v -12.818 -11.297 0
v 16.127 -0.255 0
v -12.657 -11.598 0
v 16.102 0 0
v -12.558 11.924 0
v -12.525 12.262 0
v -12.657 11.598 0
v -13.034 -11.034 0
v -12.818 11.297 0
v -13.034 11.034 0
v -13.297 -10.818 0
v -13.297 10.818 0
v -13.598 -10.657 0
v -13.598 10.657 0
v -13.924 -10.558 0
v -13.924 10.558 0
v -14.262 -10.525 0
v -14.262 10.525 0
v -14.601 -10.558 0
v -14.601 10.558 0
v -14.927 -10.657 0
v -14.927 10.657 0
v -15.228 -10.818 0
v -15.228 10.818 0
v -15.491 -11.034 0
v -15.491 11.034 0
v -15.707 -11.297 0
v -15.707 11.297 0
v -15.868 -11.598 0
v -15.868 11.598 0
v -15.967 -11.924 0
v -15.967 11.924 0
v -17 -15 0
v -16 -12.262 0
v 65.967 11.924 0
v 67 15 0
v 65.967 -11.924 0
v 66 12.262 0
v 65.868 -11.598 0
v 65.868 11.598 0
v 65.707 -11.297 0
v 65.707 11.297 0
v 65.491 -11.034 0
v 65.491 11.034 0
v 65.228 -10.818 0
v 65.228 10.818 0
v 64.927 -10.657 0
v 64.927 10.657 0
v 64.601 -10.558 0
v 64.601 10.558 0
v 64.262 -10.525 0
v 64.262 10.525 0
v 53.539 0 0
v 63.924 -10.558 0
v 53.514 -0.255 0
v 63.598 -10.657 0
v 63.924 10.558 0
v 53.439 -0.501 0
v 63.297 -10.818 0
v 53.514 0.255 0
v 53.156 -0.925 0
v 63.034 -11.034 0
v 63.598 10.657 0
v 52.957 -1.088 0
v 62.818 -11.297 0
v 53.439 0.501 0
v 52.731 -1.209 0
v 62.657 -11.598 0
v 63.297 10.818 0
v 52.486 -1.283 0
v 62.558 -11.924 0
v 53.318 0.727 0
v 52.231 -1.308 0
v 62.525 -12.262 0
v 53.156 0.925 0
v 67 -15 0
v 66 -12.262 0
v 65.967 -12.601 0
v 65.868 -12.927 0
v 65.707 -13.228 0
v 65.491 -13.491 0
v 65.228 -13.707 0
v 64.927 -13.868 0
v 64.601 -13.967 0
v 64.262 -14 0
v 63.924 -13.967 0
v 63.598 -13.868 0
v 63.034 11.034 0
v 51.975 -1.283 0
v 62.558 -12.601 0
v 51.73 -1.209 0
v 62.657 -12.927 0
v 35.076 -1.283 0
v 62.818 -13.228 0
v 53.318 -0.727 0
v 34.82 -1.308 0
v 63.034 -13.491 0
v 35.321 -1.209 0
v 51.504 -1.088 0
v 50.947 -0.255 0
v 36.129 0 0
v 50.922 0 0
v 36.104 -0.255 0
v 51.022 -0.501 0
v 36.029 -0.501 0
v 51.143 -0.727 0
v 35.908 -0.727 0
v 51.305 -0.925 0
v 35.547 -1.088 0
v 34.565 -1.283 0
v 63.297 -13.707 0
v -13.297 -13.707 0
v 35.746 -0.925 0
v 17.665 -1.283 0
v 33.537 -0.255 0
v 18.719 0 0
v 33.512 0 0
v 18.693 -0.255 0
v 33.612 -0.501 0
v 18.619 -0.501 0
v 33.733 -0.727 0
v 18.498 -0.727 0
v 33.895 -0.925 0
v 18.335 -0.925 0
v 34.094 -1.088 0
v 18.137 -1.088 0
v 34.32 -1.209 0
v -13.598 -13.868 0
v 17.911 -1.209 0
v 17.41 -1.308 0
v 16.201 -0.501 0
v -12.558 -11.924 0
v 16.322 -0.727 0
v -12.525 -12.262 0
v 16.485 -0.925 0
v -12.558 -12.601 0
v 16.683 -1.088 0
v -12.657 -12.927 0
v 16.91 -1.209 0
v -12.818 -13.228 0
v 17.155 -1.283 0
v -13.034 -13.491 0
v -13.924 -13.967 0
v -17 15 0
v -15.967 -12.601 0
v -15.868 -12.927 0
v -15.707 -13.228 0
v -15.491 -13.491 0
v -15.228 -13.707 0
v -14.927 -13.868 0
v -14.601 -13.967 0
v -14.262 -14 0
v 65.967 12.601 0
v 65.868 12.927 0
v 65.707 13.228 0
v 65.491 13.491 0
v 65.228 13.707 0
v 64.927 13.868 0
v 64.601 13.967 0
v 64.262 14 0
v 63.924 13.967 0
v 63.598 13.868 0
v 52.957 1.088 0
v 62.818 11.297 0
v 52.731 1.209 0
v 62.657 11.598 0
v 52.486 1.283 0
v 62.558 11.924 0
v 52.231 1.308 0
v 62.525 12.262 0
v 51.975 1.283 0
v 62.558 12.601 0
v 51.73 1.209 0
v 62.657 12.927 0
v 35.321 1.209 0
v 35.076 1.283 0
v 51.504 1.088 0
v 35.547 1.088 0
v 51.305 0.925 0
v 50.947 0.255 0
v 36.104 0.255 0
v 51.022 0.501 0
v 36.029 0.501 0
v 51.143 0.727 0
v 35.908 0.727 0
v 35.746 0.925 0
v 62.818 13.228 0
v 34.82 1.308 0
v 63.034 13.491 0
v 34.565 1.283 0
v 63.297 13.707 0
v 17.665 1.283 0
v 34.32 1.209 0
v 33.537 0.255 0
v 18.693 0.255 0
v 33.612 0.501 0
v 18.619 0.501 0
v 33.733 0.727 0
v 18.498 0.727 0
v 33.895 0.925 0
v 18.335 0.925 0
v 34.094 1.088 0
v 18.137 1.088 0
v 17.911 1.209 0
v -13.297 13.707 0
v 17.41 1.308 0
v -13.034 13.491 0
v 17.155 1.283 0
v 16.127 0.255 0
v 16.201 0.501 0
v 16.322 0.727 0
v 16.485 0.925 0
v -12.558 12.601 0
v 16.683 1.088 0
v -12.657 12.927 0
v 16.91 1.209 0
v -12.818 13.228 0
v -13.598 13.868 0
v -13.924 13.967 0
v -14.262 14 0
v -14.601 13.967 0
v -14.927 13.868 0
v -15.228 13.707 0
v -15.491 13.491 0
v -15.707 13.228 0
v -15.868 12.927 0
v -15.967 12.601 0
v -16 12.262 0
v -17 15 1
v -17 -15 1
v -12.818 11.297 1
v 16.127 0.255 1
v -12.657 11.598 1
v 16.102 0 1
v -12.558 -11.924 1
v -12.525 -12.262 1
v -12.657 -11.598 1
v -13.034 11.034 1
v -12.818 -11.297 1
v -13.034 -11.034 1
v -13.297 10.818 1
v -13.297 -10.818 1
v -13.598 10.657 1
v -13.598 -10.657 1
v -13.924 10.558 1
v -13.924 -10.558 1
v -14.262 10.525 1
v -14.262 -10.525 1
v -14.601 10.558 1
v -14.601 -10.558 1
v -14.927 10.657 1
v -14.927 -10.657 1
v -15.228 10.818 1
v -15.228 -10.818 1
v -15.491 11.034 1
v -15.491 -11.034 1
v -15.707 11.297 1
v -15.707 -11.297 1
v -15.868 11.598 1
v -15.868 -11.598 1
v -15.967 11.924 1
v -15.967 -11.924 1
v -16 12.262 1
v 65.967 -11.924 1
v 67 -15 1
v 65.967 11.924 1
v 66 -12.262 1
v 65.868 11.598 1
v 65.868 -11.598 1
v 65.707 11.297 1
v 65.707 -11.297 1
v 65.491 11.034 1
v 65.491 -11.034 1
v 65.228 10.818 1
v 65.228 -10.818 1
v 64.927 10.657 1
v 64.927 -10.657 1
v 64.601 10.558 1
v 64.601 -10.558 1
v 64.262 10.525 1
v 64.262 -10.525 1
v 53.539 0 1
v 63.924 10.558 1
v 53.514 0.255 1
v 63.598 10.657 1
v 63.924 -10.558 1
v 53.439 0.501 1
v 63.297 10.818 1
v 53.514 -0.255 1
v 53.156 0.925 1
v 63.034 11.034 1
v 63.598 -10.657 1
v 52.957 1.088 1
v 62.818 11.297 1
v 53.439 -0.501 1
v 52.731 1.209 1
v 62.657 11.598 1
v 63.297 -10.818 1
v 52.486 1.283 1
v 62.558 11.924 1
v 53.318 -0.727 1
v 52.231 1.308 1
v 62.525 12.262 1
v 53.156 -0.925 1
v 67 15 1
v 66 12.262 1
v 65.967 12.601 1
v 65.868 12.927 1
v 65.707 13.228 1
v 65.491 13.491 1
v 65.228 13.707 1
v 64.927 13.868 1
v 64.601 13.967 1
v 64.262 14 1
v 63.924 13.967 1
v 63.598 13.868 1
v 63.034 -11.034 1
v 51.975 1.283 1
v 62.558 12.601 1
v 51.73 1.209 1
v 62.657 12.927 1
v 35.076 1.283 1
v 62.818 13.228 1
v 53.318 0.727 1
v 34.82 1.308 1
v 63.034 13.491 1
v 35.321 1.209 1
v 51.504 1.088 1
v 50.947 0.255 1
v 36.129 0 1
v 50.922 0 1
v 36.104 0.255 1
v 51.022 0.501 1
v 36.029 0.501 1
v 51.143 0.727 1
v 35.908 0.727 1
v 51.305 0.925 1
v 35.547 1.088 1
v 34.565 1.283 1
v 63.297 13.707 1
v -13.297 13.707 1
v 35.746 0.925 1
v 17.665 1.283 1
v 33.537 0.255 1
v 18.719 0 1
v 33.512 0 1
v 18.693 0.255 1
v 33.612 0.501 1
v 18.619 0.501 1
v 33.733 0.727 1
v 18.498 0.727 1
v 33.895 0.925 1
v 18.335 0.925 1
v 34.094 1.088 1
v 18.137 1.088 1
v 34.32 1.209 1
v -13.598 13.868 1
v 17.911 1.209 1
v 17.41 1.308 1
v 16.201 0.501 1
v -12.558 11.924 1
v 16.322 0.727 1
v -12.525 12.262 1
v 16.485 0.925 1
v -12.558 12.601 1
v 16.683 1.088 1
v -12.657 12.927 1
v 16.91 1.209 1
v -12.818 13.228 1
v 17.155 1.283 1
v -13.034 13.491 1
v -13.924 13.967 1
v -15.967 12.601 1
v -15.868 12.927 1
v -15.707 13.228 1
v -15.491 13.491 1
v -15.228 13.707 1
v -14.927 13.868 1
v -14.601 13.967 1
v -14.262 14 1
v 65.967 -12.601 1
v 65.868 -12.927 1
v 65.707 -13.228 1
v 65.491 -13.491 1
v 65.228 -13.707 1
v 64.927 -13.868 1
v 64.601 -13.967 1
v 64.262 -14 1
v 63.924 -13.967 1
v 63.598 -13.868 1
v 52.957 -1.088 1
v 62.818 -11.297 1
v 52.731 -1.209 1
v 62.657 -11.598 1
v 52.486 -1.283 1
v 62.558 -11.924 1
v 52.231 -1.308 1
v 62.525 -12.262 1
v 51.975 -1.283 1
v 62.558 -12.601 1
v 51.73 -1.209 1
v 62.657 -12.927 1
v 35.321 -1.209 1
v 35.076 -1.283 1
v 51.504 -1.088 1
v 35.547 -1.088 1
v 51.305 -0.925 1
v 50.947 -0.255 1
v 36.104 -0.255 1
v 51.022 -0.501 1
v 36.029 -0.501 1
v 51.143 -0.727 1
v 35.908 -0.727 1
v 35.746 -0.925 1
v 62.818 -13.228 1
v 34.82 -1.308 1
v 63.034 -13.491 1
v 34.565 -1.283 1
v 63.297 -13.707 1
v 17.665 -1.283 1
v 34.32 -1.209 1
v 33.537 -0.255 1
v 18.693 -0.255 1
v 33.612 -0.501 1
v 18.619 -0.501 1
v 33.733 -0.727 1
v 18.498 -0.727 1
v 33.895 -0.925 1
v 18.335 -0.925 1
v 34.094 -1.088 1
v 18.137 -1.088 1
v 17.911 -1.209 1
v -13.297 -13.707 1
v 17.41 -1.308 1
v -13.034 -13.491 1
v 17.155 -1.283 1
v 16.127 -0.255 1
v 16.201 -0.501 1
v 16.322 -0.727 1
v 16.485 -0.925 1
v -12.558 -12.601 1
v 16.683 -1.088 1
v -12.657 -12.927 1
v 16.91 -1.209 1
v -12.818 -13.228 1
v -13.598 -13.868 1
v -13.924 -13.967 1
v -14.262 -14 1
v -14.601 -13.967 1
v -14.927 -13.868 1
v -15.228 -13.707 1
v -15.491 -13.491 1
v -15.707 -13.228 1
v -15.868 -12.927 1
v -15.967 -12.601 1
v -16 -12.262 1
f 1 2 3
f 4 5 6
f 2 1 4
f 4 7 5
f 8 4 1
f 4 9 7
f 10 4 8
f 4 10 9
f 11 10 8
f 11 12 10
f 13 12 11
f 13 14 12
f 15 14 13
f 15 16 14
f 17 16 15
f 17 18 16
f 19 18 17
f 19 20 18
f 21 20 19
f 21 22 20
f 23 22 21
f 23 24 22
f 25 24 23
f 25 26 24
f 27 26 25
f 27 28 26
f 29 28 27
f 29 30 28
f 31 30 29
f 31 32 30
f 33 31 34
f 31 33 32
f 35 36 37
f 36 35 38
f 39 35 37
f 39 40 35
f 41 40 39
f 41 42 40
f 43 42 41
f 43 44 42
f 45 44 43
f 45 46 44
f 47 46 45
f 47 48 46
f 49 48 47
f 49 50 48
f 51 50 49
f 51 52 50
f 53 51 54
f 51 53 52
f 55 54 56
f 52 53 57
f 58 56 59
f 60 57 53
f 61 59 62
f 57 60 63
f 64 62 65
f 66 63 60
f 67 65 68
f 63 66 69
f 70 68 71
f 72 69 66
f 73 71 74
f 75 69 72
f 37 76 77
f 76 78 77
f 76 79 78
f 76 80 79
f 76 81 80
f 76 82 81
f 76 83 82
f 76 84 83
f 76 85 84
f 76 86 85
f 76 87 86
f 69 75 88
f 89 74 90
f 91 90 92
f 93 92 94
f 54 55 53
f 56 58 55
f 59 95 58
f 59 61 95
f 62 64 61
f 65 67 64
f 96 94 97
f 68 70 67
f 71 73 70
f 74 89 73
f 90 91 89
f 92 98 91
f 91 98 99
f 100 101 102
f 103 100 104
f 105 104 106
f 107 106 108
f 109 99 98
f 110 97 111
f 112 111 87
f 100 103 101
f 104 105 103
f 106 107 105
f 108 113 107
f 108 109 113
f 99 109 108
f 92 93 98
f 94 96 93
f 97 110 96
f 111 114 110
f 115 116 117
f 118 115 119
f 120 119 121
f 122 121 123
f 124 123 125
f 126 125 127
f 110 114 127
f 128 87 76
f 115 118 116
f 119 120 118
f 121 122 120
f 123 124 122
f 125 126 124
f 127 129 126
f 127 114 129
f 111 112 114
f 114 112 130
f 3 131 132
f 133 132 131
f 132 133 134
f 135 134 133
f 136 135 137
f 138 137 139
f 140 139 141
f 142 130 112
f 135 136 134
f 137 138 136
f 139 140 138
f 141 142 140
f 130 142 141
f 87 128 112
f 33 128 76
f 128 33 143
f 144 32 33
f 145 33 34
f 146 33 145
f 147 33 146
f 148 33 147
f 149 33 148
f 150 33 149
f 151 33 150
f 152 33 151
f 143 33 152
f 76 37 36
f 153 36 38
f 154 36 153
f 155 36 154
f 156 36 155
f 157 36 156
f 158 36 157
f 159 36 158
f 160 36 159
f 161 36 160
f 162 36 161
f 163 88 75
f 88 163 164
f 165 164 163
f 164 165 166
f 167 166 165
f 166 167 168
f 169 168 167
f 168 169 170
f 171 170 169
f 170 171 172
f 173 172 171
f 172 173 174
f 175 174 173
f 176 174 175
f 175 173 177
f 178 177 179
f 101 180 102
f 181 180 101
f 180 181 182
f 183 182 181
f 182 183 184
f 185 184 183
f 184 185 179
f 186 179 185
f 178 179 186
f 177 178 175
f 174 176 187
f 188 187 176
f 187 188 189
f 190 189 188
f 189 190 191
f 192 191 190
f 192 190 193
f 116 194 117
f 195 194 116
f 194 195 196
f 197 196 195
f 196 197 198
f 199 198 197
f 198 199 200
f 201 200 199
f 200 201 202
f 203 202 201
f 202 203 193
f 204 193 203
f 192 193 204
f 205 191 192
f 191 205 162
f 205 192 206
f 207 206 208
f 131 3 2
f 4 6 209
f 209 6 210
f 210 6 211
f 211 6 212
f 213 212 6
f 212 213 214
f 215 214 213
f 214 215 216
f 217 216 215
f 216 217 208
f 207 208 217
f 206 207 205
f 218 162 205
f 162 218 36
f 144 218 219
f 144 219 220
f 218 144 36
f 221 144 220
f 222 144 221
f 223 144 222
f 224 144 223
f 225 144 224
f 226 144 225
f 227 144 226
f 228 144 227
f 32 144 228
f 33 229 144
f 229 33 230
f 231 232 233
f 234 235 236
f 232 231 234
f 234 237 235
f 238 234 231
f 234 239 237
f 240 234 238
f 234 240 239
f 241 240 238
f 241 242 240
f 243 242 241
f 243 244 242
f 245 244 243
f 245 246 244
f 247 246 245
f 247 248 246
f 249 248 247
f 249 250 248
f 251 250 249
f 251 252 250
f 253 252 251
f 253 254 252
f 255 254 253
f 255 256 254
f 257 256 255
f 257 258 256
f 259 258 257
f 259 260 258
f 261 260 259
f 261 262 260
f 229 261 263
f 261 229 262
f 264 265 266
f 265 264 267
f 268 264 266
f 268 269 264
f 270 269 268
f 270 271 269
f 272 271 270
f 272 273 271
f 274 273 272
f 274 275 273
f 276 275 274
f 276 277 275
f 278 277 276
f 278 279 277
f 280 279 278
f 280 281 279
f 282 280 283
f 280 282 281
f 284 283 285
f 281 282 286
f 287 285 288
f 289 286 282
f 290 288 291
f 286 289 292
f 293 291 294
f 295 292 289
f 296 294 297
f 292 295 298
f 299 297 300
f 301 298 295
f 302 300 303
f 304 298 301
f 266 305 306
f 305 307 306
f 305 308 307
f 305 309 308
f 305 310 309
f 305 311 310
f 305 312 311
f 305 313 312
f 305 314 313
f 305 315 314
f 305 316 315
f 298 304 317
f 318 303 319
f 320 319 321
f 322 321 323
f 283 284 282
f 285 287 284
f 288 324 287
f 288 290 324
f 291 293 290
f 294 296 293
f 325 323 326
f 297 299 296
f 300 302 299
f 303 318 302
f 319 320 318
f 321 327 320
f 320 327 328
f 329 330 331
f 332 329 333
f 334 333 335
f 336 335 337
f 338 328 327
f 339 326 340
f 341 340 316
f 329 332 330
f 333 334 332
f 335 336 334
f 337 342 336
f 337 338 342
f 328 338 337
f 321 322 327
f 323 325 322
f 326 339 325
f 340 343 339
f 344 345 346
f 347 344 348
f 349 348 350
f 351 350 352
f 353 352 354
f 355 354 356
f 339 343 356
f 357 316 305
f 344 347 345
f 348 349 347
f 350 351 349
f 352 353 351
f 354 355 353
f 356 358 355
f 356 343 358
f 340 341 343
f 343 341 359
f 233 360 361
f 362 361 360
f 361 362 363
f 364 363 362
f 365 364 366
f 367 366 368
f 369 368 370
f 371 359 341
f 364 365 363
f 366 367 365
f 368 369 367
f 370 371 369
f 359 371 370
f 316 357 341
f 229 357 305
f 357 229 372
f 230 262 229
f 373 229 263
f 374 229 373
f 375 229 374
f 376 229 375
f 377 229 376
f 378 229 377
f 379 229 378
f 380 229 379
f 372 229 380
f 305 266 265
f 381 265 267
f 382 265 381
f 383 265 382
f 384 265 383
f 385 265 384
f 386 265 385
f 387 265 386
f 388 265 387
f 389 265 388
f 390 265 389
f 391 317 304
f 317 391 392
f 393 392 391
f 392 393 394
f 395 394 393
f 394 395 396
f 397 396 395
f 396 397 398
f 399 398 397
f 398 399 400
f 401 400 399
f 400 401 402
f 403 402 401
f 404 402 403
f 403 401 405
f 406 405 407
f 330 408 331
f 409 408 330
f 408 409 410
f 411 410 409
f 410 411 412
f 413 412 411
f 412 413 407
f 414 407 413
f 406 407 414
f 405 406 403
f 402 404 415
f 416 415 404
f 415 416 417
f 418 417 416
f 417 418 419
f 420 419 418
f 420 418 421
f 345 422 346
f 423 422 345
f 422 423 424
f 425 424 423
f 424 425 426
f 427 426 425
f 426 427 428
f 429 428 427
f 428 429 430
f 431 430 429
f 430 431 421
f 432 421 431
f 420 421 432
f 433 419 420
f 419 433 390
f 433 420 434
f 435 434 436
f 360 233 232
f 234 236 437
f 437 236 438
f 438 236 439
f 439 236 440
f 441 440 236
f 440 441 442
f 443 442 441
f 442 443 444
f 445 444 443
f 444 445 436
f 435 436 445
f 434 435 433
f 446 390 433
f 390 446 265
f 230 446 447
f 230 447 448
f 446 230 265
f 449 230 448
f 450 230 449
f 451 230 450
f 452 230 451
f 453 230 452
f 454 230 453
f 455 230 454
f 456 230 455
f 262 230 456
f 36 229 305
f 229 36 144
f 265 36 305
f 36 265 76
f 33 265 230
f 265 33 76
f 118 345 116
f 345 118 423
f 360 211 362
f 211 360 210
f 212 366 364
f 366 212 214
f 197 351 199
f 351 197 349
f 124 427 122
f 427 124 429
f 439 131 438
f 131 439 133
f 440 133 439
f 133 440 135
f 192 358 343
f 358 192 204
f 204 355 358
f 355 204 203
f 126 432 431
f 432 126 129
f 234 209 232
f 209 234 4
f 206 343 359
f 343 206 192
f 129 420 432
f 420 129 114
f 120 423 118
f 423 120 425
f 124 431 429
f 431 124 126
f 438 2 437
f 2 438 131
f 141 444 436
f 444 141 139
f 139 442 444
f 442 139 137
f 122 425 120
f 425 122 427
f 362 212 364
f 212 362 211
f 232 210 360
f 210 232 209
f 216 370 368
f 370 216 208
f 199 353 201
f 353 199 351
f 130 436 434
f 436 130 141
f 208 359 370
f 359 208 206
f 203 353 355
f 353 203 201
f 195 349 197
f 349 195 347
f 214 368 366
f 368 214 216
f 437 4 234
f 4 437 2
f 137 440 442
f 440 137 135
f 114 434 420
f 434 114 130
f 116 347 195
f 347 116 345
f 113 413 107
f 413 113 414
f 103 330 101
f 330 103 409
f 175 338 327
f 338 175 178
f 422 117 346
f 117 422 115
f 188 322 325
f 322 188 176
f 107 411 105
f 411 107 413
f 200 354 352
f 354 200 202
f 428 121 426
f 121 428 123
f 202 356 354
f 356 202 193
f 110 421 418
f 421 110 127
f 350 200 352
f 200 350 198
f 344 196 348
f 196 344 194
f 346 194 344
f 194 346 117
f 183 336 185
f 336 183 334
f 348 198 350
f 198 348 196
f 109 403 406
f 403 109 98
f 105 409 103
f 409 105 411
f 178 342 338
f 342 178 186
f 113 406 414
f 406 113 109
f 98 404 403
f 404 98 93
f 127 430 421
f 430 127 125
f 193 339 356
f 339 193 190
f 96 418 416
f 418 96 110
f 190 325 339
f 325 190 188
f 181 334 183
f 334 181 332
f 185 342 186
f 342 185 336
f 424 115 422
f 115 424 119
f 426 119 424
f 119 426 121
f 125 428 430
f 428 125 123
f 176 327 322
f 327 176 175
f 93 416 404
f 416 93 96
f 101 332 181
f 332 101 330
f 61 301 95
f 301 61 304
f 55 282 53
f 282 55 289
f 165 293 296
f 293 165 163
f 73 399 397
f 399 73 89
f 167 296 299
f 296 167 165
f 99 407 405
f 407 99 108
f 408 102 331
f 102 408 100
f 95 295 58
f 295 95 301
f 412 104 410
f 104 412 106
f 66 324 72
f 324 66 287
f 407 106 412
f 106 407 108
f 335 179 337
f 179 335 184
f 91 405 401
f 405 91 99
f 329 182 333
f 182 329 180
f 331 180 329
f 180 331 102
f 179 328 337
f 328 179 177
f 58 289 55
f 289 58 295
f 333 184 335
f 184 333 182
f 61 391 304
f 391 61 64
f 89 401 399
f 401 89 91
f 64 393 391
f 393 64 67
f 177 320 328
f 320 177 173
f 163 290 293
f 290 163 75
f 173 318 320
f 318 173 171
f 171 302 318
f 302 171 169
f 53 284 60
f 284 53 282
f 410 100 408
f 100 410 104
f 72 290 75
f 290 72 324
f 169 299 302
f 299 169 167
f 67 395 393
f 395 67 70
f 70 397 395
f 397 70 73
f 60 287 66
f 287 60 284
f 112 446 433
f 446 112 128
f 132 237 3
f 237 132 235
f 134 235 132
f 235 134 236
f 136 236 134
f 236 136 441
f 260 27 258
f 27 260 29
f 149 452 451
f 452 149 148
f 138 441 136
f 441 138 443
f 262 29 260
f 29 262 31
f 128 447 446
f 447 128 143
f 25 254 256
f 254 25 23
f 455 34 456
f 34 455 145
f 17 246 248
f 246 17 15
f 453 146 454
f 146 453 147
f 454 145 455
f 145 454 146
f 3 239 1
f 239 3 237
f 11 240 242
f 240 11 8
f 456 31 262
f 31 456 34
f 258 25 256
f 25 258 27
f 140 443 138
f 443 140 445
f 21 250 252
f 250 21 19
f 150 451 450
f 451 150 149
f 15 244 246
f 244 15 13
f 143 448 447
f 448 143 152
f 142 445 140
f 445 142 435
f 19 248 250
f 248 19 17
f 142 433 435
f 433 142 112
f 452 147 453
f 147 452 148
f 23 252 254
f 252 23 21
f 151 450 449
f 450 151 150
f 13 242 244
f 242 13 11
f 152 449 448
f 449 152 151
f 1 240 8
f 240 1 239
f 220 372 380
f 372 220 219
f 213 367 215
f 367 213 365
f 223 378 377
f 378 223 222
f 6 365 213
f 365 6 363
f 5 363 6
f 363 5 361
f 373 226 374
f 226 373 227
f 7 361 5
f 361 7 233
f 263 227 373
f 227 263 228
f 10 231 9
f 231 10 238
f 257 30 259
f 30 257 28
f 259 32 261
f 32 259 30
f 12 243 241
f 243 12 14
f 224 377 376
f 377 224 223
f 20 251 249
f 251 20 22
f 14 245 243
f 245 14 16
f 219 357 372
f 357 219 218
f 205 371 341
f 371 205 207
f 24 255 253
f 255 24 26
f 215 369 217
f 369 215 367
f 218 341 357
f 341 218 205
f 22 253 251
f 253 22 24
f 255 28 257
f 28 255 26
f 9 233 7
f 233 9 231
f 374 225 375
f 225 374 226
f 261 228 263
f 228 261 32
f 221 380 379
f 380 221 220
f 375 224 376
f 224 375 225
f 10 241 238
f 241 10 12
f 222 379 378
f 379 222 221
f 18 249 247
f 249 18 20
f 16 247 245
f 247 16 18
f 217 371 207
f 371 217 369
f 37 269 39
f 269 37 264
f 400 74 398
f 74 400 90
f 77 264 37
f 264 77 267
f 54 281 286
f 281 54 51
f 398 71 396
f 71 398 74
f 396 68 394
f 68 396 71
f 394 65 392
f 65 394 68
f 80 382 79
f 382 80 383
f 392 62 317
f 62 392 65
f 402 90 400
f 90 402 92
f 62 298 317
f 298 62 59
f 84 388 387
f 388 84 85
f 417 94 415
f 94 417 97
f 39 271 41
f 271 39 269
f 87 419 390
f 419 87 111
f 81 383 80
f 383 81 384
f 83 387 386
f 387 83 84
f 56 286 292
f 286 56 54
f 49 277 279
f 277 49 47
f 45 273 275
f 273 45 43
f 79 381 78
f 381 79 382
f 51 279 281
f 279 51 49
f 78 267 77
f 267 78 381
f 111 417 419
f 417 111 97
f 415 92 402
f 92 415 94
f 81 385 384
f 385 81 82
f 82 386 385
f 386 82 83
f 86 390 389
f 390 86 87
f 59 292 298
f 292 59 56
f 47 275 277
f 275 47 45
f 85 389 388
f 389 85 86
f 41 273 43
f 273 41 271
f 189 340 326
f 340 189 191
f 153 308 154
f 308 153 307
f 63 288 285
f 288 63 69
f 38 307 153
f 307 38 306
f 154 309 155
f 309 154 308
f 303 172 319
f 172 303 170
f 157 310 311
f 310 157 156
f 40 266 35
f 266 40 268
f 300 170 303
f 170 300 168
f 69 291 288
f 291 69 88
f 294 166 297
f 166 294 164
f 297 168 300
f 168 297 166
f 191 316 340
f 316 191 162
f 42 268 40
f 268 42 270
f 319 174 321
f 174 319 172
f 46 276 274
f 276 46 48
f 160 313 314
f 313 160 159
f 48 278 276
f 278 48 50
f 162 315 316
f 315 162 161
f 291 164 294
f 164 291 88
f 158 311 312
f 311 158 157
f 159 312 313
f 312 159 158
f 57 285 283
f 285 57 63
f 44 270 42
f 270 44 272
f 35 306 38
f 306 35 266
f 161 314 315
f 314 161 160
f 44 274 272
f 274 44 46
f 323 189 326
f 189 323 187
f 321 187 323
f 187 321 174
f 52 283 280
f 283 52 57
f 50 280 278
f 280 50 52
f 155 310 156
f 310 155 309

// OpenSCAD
// motor holder
//
// motor has radius of '$mr' with flattened sides at '$mh' and length of '$ml'

// NOTE:  some tolerance added 
$mr = 10.4; // 10 mm radius + shrinkage (was 10.7)
$mh = 15.8; // 15 mm height + shrinkage
$ml = 25.0; // 25.0 mm length excluding 'nubs'
$ml2 = 19.5; // 19.5 mm lengh excluding end cap and shaft guide hole 'nub'

$th = 4.0; // overall thickness of plastic around motor
// NOTE:  wall thickness on sides is 1/2 this

// shaft guide hole size
$sh = 3.1;  // 3.1mm radius
$sw = 2;  // 2mm approximate height of guide
$ft = 1;  // 1mm approximate thickness of face
$pr = 2;  // 2mm appx radius of post

$sd1 = 0.97 * 2.54 * 1.02 / 2; // shaft radius
$sd2 = 1.01 * 2.54 * 1.02 / 2; // loose shaft radius

// motor shaft extension length
$sl = 10.0; // length of shaft from flat end of motor
$gh = 5.5;  // radius of gear hole



// global accuracy parameters
$fn=32; // number of faces in shape

module face(hh,bb=0)
{
  mrr = $mr + bb;  
    
  union()
  {
    difference()
    {
      linear_extrude(height=hh)
        square([$mh + $th, mrr * 2 + $th], true);

      translate([0,0,-1])
        linear_extrude(height=hh+2)
          polygon(points=[[-$mh/2,-mrr],[$mh/2,-mrr],[$mh/2,mrr],[-$mh/2,mrr]]);
    }

    difference()
    {
      linear_extrude(height=hh)
        polygon(points=[[-$mh/2,-mrr],[$mh/2,-mrr],[$mh/2,mrr],[-$mh/2,mrr]]);

      translate([0,0,-1])
        linear_extrude(height=hh+2)
          circle(mrr);
    }
  }
}

module motor_holder()
{
  translate([0,0,$ft])
    union()
    {
      color("green")  
        face($sw,-0.3);

      color("yellow")
        union()
        {
          translate([-$mh/2,-$mr,0])
            linear_extrude(height=$ml2-$sw+1)
              circle($pr);

          translate([-$mh/2,$mr,0])
            linear_extrude(height=$ml2-$sw+1)
              circle($pr);

          translate([$mh/2,-$mr,0])
            linear_extrude(height=$ml2-$sw+1)
              circle($pr);

          translate([$mh/2,$mr,0])
            linear_extrude(height=$ml2-$sw+1)
              circle($pr);
        }

      color("blue")
        translate([0, 0, $ml2-$sw])
          face($sw,0);
    }

//  color("purple")
//    difference()
//    {
//      linear_extrude(height=$ft)
//        square([$mh + $th, $mr * 2 + $th], true);
  
//      translate([0,0,-1])
//        linear_extrude(height=$ft+2)
//          circle($gh);
//    }
}

//  echo("****************");
//  echo("face is ",$mh+$th," by ", $mr * 2 + $th," (mm)");

//  echo("overall height is ", $ft + $ml2, " (mm)");
//  echo("****************");

$xd = 25.4 / 8 + 0.3; // screw holes

$mp = 25; // motor position (offset)
$ll = 84; // length of holder
$ww = 30; // width of holder
$ff = $xd/2+1;  // offset of hole from edge
$gt = 0.07;     // gear tolerance (mm)

//rotate(a=[0,0,0])
//  motor_holder();

color("orange")
  difference()
  {
    translate([$mp,0,0])
      linear_extrude(height=$ft)
        square([$ll,$ww],true);

//    translate([0,0,-1])
//      linear_extrude(height=$ft+2)
//        circle($gh);

  // from gear_test2
  // gear wheel radius: 0.125 in 3.175 mm
  // Tooth side length: 0.0669041 in 1.69937 mm
  // gear radius: 0.185786 in 4.71897 mm

  // from gear-test4
  // gear wheel radius: 0.4923, in 12.5044 mm
  // Tooth side length: 0.0669012 in 1.69929 mm
  // gear radius: 0.557684 in 14.1652 mm

    translate([3.175+14.1652+$gt, 0,-1])
      linear_extrude(height=$ft+2)
        circle($sd2);
    
    translate([2*(3.175+14.1652+$gt), 0,-1])
      linear_extrude(height=$ft+2)
        circle($sd2);

    translate([3*(3.175+14.1652+$gt), 0,-1])
      linear_extrude(height=$ft+2)
        circle($sd2);

    dx=$ll/2-$ff;
    dy=$ww/2-$ff;

    translate([$mp-dx,-dy,-1])
      linear_extrude(height=$ft+2)
        circle(d=$xd);
    translate([$mp-dx,dy,-1])
      linear_extrude(height=$ft+2)
        circle(d=$xd);
    translate([$mp+dx,-dy,-1])
      linear_extrude(height=$ft+2)
        circle(d=$xd);
    translate([$mp+dx,dy,-1])
      linear_extrude(height=$ft+2)
        circle(d=$xd);
  }
  

//  color("purple")
//    translate([3*(3.175+14.1653+$gt), 0, 1])
//      linear_extrude(height=.1)
//        circle(14.1653);
